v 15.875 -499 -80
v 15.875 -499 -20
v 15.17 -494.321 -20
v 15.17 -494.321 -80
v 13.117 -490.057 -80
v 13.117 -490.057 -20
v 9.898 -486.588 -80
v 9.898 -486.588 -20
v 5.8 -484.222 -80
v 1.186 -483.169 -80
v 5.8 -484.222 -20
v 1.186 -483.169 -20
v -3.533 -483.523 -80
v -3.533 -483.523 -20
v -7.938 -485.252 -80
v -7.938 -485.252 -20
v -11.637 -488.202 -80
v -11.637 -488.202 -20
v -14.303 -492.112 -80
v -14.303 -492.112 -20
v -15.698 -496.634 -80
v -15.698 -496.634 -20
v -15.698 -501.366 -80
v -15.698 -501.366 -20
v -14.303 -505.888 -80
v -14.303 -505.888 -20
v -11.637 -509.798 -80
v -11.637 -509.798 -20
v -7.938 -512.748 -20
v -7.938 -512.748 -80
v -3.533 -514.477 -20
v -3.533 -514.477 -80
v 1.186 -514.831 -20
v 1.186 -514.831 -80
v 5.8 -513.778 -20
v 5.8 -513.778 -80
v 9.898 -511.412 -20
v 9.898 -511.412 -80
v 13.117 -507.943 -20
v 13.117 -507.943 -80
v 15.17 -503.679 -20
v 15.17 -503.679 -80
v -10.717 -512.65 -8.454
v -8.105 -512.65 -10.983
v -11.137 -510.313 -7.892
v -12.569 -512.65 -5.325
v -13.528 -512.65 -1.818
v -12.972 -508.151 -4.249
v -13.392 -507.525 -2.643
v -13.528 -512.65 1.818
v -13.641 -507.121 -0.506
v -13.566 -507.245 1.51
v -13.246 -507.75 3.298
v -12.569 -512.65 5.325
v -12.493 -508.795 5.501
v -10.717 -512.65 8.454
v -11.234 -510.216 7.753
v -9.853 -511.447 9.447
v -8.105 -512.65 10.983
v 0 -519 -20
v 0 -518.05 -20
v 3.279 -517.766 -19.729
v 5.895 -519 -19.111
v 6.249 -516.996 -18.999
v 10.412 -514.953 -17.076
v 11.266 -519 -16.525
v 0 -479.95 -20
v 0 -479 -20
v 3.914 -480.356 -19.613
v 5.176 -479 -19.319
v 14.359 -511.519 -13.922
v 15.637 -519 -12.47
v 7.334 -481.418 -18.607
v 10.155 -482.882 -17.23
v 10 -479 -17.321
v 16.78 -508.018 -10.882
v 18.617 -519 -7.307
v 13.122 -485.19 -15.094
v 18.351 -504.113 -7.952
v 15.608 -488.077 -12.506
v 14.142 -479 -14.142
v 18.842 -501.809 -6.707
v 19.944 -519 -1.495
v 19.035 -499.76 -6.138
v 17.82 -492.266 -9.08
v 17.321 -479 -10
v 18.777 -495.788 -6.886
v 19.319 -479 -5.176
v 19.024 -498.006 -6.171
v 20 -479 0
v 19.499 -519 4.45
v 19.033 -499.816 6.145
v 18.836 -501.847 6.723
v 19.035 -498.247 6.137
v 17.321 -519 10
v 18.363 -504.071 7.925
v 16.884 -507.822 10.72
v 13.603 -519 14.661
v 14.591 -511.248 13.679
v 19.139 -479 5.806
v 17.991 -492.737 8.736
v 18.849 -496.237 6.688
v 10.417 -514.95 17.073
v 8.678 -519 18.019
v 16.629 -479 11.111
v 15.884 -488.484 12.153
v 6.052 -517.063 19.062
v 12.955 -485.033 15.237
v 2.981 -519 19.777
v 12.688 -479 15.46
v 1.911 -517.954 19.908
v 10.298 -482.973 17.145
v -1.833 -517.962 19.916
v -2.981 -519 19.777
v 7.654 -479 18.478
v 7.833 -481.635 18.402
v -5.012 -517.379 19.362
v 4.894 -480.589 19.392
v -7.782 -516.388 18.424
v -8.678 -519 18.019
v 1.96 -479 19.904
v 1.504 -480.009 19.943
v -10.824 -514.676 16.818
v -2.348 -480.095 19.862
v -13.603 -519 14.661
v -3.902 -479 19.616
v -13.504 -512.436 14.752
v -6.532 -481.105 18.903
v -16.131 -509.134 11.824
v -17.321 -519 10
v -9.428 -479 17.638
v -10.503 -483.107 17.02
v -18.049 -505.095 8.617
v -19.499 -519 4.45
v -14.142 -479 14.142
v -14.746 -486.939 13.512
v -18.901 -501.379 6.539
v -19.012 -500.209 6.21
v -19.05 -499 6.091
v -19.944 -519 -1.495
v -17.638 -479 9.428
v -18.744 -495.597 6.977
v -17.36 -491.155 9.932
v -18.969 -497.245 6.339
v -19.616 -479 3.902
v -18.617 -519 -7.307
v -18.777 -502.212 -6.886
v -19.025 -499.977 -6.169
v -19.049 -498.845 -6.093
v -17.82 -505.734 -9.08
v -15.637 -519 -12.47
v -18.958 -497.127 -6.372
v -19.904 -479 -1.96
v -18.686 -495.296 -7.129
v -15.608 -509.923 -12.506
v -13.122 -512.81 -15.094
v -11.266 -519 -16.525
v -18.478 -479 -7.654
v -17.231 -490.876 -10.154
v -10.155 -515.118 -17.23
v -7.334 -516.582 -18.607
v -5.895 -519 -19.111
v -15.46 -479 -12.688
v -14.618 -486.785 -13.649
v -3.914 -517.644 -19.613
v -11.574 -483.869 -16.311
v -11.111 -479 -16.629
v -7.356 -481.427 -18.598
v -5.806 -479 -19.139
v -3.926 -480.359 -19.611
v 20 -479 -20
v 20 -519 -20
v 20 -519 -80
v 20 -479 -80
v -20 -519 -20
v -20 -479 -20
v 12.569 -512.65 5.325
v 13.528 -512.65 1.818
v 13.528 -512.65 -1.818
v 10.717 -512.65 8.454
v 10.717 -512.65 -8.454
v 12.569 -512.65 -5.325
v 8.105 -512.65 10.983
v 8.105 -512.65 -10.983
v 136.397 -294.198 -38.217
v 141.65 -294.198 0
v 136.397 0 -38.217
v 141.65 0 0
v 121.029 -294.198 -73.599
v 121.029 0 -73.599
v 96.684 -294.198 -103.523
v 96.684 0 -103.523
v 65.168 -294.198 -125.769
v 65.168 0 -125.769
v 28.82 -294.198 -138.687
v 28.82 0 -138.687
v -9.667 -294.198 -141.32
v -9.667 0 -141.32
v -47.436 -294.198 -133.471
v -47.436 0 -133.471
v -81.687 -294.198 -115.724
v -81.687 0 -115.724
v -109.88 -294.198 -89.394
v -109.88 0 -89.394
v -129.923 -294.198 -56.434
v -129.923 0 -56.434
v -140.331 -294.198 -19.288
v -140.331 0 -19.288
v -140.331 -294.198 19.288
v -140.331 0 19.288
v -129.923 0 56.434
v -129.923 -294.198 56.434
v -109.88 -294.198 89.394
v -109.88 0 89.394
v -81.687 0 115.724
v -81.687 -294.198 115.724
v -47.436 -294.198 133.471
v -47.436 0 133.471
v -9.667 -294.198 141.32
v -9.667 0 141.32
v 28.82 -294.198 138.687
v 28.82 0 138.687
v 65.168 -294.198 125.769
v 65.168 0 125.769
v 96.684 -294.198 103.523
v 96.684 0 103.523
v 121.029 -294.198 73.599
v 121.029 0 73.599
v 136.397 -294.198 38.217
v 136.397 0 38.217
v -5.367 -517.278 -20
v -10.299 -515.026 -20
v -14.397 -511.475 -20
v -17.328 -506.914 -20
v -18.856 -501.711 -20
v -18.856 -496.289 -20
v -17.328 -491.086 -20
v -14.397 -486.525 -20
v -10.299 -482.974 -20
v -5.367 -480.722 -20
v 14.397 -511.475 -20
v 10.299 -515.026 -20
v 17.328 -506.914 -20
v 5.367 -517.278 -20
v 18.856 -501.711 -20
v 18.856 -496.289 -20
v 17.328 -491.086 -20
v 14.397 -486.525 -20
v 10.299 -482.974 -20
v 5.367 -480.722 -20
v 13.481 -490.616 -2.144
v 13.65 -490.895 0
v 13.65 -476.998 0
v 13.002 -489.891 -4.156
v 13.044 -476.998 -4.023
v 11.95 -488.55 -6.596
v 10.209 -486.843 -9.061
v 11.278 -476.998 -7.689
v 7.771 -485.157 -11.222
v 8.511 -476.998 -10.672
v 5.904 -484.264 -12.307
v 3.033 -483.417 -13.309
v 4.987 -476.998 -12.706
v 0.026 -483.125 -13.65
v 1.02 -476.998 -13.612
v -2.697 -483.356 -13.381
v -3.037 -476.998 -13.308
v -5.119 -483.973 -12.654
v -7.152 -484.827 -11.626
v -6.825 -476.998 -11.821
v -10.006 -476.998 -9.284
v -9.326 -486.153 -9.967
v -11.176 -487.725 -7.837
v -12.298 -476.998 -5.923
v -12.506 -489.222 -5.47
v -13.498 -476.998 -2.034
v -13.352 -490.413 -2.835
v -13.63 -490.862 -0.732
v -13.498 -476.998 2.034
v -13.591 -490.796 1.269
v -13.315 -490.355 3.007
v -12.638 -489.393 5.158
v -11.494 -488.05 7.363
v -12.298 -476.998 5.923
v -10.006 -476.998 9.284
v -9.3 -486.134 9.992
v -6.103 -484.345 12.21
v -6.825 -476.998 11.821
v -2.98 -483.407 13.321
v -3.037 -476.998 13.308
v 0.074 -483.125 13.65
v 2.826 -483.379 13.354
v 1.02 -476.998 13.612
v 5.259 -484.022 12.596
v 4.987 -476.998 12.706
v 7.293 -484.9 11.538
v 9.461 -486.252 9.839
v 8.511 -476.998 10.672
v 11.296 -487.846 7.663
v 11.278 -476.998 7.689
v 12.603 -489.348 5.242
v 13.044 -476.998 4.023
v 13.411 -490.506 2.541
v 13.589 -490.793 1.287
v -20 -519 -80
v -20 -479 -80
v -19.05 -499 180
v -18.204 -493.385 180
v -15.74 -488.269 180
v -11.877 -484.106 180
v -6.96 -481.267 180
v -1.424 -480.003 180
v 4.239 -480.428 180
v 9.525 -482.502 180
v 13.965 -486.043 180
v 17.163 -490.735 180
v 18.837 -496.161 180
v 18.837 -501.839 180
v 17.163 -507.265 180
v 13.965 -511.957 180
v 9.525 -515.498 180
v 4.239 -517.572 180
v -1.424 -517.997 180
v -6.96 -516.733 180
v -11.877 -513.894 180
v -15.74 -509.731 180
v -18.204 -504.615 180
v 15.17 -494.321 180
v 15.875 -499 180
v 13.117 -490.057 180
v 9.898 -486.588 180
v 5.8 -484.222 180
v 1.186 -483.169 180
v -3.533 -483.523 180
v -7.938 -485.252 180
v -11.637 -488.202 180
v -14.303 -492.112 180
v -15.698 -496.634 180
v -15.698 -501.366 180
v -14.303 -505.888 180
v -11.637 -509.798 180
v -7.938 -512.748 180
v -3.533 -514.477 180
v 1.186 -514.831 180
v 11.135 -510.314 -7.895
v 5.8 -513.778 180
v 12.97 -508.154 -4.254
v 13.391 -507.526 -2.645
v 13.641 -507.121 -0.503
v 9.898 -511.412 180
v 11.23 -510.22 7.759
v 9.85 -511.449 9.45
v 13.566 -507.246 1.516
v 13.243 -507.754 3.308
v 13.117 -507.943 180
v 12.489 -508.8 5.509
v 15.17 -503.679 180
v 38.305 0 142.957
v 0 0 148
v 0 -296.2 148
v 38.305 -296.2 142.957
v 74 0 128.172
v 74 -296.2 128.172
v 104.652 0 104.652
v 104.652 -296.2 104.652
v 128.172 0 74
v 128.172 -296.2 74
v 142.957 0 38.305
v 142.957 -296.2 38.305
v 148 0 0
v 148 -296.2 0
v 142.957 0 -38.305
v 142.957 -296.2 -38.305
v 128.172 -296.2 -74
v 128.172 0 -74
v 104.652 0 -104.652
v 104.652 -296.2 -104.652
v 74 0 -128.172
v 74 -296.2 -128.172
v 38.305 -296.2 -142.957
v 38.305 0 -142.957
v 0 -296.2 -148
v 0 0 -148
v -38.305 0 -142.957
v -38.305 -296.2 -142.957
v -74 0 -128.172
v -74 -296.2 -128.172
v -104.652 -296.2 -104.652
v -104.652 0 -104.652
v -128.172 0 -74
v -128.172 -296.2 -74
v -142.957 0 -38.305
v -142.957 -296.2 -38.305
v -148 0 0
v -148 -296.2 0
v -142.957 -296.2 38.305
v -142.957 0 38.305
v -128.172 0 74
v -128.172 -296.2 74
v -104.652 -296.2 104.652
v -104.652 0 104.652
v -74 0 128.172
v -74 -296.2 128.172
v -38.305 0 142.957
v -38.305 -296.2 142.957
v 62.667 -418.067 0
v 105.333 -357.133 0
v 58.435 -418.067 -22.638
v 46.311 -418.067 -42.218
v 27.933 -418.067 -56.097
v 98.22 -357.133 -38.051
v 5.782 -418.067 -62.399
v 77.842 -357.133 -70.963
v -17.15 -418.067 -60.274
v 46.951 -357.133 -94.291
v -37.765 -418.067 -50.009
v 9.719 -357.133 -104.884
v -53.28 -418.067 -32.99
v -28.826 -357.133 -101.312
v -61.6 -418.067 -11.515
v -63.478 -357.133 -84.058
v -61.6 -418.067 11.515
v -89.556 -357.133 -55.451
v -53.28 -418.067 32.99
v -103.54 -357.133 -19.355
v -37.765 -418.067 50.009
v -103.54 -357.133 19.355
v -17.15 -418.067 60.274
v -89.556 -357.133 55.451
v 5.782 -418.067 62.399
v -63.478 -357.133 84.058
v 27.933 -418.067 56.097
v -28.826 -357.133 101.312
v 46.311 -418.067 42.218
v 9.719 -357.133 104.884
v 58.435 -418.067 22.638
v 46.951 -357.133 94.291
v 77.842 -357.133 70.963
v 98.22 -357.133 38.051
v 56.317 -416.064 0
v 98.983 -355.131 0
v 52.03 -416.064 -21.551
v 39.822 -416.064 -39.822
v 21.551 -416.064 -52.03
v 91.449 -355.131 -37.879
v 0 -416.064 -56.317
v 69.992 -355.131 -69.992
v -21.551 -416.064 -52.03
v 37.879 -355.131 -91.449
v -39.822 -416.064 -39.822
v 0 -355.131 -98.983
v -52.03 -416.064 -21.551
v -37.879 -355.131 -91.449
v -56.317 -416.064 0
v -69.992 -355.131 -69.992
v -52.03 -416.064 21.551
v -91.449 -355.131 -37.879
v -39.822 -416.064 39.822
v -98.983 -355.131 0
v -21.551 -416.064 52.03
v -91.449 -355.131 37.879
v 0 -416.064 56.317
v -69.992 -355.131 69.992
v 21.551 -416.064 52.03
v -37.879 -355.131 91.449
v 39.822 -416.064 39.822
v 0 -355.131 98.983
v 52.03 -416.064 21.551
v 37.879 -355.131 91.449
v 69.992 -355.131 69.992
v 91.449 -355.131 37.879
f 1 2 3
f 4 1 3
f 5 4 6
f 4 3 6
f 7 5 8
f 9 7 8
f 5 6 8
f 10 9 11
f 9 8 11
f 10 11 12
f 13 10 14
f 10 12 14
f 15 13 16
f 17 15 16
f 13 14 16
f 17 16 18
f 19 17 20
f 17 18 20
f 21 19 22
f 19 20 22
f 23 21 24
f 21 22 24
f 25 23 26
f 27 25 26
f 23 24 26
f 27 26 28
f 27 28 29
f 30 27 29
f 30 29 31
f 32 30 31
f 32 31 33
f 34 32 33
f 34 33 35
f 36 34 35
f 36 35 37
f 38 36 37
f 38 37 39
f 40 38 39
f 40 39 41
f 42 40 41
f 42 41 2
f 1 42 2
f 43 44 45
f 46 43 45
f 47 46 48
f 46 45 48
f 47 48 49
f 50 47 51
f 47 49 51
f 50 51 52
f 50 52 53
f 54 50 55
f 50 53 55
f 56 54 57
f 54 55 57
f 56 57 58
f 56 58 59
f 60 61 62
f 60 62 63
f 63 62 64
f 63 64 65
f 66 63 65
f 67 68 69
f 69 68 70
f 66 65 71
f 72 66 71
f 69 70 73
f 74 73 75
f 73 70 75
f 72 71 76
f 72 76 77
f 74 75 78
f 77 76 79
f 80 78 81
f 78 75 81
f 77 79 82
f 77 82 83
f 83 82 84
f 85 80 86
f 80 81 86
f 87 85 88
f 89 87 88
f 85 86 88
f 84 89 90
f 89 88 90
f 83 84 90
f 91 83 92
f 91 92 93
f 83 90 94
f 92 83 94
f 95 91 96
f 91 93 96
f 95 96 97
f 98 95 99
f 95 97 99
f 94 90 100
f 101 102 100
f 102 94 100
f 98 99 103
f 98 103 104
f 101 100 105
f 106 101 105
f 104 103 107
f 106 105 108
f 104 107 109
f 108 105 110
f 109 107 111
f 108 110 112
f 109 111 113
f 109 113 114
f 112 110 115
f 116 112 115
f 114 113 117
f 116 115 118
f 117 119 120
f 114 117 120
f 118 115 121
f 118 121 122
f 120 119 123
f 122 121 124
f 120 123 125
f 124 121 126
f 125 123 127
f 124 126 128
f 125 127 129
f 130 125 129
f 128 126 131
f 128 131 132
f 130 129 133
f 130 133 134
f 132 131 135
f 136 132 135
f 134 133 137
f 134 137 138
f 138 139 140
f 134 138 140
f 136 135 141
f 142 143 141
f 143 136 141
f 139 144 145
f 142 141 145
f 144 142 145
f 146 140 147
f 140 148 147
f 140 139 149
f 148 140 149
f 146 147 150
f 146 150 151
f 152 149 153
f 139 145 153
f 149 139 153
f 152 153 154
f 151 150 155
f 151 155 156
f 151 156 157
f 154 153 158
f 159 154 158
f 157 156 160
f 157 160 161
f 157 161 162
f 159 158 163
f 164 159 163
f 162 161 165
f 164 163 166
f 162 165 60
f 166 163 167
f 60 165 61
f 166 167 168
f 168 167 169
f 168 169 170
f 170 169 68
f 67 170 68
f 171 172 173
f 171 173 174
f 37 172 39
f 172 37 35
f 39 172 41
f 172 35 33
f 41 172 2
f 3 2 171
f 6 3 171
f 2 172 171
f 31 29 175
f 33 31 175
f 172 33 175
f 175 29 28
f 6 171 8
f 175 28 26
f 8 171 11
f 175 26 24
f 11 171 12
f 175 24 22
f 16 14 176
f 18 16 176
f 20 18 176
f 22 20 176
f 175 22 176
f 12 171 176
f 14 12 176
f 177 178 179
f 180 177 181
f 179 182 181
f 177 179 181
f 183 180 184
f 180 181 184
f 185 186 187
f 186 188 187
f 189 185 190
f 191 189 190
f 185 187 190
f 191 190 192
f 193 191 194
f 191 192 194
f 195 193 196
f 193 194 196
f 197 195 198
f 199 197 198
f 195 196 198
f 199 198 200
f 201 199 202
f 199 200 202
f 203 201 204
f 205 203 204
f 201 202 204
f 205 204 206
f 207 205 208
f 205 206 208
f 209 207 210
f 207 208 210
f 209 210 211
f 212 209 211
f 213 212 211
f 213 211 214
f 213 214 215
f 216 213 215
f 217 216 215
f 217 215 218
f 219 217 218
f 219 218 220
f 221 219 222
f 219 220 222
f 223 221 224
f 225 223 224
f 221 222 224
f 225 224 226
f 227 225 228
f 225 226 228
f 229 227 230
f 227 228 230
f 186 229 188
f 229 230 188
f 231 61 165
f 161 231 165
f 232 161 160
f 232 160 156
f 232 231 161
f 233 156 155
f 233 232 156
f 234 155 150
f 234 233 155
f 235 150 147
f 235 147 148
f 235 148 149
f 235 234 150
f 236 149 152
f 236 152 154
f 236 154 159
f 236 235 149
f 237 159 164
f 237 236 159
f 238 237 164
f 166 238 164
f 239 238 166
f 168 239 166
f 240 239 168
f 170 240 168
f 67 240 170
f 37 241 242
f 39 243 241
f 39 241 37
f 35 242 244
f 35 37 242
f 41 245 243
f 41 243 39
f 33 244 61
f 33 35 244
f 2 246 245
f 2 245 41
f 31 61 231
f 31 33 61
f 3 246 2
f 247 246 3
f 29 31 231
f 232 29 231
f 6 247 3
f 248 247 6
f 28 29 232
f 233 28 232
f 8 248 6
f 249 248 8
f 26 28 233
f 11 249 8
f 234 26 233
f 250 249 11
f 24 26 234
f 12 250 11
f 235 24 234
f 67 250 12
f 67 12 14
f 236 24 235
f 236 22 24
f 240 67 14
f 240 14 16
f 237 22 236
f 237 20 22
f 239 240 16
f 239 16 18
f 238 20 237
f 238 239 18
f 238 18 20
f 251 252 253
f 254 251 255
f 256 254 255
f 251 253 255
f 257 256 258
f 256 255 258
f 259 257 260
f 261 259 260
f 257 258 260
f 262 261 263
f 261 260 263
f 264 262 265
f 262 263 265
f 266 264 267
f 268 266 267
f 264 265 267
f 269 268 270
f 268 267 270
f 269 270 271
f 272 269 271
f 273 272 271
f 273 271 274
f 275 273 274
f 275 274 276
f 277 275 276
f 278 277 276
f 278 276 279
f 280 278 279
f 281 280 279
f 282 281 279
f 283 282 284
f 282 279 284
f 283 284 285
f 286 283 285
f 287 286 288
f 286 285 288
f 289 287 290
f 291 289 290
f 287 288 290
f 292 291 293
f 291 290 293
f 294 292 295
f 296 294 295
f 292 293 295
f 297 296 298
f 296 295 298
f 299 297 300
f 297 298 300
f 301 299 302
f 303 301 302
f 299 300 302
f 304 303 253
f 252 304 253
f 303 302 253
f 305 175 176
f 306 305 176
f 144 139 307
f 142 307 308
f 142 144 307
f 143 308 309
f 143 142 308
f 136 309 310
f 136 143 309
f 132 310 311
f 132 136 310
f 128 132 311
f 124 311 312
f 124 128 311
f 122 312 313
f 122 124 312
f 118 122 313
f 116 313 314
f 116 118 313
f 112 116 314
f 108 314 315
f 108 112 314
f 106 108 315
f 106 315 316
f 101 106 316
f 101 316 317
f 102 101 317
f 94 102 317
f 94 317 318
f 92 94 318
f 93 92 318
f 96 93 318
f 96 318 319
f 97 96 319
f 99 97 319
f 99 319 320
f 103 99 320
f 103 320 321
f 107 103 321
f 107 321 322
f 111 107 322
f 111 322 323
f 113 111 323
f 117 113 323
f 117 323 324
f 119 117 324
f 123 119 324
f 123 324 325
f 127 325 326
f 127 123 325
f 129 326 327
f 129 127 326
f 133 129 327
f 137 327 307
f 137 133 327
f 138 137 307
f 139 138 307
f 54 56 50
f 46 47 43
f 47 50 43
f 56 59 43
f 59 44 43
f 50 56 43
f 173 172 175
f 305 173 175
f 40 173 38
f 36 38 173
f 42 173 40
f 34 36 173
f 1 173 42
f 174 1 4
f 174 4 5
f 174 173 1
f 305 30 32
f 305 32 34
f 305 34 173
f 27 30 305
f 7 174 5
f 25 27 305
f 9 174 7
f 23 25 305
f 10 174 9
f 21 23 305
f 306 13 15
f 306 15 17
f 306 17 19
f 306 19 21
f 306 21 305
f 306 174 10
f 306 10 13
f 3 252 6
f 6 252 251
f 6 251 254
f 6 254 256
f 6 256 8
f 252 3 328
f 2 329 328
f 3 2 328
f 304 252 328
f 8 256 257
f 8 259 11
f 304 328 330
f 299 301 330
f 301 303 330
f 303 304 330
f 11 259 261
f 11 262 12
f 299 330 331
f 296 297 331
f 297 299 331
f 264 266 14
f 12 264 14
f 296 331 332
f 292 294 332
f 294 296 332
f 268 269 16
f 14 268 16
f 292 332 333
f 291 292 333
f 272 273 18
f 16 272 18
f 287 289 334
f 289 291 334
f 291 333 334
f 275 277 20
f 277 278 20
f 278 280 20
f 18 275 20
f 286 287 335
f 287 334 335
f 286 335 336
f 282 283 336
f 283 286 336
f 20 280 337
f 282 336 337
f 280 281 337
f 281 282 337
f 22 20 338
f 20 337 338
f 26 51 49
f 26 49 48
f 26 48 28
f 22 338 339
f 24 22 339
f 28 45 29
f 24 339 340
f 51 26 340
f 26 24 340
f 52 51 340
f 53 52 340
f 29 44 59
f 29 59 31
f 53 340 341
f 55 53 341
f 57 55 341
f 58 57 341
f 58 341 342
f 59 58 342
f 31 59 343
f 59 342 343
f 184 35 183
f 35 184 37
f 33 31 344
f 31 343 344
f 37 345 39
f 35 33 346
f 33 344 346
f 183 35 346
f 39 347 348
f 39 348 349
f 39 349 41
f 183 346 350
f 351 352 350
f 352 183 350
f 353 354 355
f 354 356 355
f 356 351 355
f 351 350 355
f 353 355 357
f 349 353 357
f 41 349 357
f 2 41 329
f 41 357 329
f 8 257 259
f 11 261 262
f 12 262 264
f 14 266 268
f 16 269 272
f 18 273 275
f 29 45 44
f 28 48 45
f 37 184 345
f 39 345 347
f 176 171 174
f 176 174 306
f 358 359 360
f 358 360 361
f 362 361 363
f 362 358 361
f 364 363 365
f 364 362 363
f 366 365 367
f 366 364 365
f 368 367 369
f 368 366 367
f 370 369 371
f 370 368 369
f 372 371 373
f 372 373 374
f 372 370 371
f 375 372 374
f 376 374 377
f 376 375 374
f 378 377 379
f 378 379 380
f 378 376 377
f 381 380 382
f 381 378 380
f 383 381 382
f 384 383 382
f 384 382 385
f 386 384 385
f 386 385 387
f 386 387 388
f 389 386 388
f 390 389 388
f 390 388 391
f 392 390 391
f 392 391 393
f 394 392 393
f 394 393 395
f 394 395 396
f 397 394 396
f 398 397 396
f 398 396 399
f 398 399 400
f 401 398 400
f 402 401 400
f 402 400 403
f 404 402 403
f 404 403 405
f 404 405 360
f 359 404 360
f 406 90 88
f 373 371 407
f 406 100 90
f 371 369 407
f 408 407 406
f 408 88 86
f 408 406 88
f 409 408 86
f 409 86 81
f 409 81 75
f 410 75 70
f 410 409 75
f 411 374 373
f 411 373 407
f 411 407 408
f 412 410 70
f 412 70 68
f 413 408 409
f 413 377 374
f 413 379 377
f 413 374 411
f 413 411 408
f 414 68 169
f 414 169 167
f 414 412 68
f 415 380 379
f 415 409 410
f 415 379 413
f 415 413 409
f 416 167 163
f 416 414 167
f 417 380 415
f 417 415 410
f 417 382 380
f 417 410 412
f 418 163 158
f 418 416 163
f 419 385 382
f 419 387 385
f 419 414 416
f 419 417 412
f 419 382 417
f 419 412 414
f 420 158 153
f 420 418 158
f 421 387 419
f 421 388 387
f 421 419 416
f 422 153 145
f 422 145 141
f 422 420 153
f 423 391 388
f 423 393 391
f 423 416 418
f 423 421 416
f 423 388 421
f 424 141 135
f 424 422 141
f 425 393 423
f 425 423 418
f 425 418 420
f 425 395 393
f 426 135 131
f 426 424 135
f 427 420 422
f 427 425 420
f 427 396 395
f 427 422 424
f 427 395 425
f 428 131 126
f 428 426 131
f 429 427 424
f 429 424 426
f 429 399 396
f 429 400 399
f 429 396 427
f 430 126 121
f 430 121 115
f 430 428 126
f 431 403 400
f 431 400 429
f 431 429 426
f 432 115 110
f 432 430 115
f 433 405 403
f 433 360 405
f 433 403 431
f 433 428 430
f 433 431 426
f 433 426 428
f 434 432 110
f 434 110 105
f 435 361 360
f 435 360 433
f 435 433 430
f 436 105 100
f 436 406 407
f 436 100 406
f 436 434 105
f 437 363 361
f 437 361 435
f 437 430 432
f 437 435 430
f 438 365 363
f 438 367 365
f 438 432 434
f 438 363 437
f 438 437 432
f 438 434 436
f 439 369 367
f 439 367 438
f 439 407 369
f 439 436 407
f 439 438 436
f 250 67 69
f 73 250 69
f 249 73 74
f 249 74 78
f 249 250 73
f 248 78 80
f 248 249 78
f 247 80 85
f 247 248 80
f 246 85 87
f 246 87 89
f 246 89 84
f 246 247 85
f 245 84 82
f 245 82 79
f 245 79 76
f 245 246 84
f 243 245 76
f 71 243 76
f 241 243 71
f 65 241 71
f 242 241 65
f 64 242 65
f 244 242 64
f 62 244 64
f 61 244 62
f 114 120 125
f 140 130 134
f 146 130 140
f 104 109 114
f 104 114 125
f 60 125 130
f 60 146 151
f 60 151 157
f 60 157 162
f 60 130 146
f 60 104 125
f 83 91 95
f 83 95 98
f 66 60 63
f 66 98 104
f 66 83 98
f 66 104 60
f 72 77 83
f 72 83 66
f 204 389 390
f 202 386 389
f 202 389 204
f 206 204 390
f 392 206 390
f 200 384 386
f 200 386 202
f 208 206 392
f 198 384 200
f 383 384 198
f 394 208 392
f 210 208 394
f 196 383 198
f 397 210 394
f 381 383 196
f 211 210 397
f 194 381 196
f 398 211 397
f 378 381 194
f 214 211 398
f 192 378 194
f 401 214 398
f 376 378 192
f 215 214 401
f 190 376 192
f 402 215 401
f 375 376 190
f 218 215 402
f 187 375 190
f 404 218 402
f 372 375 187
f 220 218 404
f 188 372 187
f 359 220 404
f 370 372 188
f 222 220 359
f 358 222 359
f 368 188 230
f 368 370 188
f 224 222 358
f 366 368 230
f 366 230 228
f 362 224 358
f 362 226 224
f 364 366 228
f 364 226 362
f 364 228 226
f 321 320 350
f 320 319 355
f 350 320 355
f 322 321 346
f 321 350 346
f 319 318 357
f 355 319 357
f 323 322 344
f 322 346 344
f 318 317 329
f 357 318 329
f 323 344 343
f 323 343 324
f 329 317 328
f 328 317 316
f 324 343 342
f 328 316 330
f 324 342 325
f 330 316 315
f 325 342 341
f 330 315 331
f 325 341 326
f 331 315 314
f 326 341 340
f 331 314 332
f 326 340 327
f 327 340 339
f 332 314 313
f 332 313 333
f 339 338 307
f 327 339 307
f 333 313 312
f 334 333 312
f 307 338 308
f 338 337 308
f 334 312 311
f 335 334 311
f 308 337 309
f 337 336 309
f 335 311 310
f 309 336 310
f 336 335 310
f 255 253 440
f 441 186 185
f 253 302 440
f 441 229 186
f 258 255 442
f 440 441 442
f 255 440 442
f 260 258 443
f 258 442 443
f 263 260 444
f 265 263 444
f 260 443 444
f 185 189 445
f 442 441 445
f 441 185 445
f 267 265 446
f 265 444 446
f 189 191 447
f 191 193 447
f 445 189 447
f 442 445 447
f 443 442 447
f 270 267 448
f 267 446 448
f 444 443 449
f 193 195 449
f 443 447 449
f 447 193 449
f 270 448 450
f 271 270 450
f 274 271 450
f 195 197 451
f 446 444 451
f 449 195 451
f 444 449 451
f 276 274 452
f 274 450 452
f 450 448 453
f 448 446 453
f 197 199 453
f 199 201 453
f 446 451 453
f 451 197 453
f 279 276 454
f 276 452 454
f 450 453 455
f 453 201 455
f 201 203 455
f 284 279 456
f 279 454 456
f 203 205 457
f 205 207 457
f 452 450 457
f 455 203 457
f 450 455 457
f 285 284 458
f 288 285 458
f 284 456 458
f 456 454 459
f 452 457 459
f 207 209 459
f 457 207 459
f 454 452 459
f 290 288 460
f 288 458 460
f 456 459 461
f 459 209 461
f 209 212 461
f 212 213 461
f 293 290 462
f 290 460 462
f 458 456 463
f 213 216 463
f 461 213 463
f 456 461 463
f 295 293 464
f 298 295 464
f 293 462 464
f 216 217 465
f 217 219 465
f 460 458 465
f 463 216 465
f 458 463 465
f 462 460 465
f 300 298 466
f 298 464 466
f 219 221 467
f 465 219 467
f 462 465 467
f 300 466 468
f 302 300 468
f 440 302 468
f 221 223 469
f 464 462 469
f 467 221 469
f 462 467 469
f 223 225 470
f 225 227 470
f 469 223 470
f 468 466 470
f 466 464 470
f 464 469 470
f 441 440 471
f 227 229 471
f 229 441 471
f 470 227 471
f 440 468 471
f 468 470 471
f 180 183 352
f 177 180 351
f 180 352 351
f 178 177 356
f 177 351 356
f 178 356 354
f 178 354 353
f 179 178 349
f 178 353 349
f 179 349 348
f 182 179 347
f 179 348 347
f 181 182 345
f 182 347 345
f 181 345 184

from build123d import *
from build123d.topology import SkipClean

# Parameters (mm, degrees)
CROQUIS1_R              = 148
SALIENTE_EXTRUIR1_DEPTH = 296.2
CROQUIS3_R              = 20
CROQUIS2_R              = 148
CROQUIS4_R              = 20
SALIENTE_EXTRUIR2_DEPTH = 40
CROQUIS5_R              = 19.05
SALIENTE_EXTRUIR3_DEPTH = 200
CROQUIS6_W              = 40
CROQUIS6_H              = 40
SALIENTE_EXTRUIR4_DEPTH = 60
VACIADO1_START          = -13.65
VACIADO1_OUTLINE_R      = 12.7
VACIADO1_DEPTH          = 193.65
CROQUIS7_R              = 15.875
CORTAR_EXTRUIR1_DEPTH   = 403


with BuildPart() as part:
    # Croquis1 → Saliente-Extruir1 (new body)
    with BuildSketch(Plane(origin=(0, 0, 0), x_dir=(1, 0, 0), z_dir=(0, 1, 0))):
        with Locations(Location((0, 0, 0), (0, 0, 270))):
            Circle(CROQUIS1_R)
    extrude(amount=-SALIENTE_EXTRUIR1_DEPTH)

    # Croquis3 → Recubrir1 section 0
    with BuildSketch(Plane(origin=(0, -479, 0), x_dir=(1, 0, 0), z_dir=(0, 1, 0))):
        Circle(CROQUIS3_R)
    # Croquis2 → Recubrir1 section 1
    with BuildSketch(Plane.XZ.offset(296.2)):
        Circle(CROQUIS2_R)
    loft()

    # Croquis4 → Saliente-Extruir2 (add)
    with BuildSketch(Plane.XZ.offset(479)):
        with Locations(Location((0, 0, 0), (0, 0, 270))):
            Circle(CROQUIS4_R)
    extrude(amount=SALIENTE_EXTRUIR2_DEPTH)

    # Croquis5 → Saliente-Extruir3 (add)
    with BuildSketch(Plane(origin=(0, 0, -20), x_dir=(-1, 0, 0), z_dir=(0, 0, -1))):
        with Locations((0, -499)):
            Circle(CROQUIS5_R)
    extrude(amount=-SALIENTE_EXTRUIR3_DEPTH)

    # Vaciado1: read off the stored shape, not the designer's step
    # Vaciado1 outline → Vaciado1 (cut)
    with BuildSketch(Plane.XY.offset(VACIADO1_START)):
        with Locations((0, -499)):
            Circle(VACIADO1_OUTLINE_R)
    extrude(amount=VACIADO1_DEPTH, mode=Mode.SUBTRACT)

    # Vaciado1 2 outline → Vaciado1 2 (revolve, cut)
    with SkipClean():  # the faces are left unmerged after this step: merging them gives an invalid solid
        with BuildSketch(Plane.XY):
            Polygon((13.65, -476.99782627), (141.65, -294.19782627), (141.65, 0), (0, 0), (0, -512.65), (13.65, -512.65), align=None)
        revolve(axis=Axis((0, 0, 0), (0, 1, 0)), mode=Mode.SUBTRACT)


with BuildPart() as body_2:
    # Croquis6 → Saliente-Extruir4 (new body)
    with BuildSketch(Plane(origin=(0, 0, -20), x_dir=(-1, 0, 0), z_dir=(0, 0, -1))):
        with Locations((0, -499)):
            Rectangle(CROQUIS6_W, CROQUIS6_H)
    extrude(amount=SALIENTE_EXTRUIR4_DEPTH)


with BuildPart() as cortar_extruir1_tool:
    # Croquis7 → Cortar-Extruir1 (new body)
    with BuildSketch(Plane.XY.offset(180)):
        with Locations((0, -499)):
            Circle(CROQUIS7_R)
    extrude(amount=-CORTAR_EXTRUIR1_DEPTH)


with BuildPart() as part_1:
    add(part.part)

    # Cortar-Extruir1: cut by cortar_extruir1_tool
    add(cortar_extruir1_tool.part, mode=Mode.SUBTRACT)


with BuildPart() as body_2_1:
    add(body_2.part)

    # Cortar-Extruir1: cut by cortar_extruir1_tool
    add(cortar_extruir1_tool.part, mode=Mode.SUBTRACT)


solid = Compound([part_1.part, body_2_1.part])
